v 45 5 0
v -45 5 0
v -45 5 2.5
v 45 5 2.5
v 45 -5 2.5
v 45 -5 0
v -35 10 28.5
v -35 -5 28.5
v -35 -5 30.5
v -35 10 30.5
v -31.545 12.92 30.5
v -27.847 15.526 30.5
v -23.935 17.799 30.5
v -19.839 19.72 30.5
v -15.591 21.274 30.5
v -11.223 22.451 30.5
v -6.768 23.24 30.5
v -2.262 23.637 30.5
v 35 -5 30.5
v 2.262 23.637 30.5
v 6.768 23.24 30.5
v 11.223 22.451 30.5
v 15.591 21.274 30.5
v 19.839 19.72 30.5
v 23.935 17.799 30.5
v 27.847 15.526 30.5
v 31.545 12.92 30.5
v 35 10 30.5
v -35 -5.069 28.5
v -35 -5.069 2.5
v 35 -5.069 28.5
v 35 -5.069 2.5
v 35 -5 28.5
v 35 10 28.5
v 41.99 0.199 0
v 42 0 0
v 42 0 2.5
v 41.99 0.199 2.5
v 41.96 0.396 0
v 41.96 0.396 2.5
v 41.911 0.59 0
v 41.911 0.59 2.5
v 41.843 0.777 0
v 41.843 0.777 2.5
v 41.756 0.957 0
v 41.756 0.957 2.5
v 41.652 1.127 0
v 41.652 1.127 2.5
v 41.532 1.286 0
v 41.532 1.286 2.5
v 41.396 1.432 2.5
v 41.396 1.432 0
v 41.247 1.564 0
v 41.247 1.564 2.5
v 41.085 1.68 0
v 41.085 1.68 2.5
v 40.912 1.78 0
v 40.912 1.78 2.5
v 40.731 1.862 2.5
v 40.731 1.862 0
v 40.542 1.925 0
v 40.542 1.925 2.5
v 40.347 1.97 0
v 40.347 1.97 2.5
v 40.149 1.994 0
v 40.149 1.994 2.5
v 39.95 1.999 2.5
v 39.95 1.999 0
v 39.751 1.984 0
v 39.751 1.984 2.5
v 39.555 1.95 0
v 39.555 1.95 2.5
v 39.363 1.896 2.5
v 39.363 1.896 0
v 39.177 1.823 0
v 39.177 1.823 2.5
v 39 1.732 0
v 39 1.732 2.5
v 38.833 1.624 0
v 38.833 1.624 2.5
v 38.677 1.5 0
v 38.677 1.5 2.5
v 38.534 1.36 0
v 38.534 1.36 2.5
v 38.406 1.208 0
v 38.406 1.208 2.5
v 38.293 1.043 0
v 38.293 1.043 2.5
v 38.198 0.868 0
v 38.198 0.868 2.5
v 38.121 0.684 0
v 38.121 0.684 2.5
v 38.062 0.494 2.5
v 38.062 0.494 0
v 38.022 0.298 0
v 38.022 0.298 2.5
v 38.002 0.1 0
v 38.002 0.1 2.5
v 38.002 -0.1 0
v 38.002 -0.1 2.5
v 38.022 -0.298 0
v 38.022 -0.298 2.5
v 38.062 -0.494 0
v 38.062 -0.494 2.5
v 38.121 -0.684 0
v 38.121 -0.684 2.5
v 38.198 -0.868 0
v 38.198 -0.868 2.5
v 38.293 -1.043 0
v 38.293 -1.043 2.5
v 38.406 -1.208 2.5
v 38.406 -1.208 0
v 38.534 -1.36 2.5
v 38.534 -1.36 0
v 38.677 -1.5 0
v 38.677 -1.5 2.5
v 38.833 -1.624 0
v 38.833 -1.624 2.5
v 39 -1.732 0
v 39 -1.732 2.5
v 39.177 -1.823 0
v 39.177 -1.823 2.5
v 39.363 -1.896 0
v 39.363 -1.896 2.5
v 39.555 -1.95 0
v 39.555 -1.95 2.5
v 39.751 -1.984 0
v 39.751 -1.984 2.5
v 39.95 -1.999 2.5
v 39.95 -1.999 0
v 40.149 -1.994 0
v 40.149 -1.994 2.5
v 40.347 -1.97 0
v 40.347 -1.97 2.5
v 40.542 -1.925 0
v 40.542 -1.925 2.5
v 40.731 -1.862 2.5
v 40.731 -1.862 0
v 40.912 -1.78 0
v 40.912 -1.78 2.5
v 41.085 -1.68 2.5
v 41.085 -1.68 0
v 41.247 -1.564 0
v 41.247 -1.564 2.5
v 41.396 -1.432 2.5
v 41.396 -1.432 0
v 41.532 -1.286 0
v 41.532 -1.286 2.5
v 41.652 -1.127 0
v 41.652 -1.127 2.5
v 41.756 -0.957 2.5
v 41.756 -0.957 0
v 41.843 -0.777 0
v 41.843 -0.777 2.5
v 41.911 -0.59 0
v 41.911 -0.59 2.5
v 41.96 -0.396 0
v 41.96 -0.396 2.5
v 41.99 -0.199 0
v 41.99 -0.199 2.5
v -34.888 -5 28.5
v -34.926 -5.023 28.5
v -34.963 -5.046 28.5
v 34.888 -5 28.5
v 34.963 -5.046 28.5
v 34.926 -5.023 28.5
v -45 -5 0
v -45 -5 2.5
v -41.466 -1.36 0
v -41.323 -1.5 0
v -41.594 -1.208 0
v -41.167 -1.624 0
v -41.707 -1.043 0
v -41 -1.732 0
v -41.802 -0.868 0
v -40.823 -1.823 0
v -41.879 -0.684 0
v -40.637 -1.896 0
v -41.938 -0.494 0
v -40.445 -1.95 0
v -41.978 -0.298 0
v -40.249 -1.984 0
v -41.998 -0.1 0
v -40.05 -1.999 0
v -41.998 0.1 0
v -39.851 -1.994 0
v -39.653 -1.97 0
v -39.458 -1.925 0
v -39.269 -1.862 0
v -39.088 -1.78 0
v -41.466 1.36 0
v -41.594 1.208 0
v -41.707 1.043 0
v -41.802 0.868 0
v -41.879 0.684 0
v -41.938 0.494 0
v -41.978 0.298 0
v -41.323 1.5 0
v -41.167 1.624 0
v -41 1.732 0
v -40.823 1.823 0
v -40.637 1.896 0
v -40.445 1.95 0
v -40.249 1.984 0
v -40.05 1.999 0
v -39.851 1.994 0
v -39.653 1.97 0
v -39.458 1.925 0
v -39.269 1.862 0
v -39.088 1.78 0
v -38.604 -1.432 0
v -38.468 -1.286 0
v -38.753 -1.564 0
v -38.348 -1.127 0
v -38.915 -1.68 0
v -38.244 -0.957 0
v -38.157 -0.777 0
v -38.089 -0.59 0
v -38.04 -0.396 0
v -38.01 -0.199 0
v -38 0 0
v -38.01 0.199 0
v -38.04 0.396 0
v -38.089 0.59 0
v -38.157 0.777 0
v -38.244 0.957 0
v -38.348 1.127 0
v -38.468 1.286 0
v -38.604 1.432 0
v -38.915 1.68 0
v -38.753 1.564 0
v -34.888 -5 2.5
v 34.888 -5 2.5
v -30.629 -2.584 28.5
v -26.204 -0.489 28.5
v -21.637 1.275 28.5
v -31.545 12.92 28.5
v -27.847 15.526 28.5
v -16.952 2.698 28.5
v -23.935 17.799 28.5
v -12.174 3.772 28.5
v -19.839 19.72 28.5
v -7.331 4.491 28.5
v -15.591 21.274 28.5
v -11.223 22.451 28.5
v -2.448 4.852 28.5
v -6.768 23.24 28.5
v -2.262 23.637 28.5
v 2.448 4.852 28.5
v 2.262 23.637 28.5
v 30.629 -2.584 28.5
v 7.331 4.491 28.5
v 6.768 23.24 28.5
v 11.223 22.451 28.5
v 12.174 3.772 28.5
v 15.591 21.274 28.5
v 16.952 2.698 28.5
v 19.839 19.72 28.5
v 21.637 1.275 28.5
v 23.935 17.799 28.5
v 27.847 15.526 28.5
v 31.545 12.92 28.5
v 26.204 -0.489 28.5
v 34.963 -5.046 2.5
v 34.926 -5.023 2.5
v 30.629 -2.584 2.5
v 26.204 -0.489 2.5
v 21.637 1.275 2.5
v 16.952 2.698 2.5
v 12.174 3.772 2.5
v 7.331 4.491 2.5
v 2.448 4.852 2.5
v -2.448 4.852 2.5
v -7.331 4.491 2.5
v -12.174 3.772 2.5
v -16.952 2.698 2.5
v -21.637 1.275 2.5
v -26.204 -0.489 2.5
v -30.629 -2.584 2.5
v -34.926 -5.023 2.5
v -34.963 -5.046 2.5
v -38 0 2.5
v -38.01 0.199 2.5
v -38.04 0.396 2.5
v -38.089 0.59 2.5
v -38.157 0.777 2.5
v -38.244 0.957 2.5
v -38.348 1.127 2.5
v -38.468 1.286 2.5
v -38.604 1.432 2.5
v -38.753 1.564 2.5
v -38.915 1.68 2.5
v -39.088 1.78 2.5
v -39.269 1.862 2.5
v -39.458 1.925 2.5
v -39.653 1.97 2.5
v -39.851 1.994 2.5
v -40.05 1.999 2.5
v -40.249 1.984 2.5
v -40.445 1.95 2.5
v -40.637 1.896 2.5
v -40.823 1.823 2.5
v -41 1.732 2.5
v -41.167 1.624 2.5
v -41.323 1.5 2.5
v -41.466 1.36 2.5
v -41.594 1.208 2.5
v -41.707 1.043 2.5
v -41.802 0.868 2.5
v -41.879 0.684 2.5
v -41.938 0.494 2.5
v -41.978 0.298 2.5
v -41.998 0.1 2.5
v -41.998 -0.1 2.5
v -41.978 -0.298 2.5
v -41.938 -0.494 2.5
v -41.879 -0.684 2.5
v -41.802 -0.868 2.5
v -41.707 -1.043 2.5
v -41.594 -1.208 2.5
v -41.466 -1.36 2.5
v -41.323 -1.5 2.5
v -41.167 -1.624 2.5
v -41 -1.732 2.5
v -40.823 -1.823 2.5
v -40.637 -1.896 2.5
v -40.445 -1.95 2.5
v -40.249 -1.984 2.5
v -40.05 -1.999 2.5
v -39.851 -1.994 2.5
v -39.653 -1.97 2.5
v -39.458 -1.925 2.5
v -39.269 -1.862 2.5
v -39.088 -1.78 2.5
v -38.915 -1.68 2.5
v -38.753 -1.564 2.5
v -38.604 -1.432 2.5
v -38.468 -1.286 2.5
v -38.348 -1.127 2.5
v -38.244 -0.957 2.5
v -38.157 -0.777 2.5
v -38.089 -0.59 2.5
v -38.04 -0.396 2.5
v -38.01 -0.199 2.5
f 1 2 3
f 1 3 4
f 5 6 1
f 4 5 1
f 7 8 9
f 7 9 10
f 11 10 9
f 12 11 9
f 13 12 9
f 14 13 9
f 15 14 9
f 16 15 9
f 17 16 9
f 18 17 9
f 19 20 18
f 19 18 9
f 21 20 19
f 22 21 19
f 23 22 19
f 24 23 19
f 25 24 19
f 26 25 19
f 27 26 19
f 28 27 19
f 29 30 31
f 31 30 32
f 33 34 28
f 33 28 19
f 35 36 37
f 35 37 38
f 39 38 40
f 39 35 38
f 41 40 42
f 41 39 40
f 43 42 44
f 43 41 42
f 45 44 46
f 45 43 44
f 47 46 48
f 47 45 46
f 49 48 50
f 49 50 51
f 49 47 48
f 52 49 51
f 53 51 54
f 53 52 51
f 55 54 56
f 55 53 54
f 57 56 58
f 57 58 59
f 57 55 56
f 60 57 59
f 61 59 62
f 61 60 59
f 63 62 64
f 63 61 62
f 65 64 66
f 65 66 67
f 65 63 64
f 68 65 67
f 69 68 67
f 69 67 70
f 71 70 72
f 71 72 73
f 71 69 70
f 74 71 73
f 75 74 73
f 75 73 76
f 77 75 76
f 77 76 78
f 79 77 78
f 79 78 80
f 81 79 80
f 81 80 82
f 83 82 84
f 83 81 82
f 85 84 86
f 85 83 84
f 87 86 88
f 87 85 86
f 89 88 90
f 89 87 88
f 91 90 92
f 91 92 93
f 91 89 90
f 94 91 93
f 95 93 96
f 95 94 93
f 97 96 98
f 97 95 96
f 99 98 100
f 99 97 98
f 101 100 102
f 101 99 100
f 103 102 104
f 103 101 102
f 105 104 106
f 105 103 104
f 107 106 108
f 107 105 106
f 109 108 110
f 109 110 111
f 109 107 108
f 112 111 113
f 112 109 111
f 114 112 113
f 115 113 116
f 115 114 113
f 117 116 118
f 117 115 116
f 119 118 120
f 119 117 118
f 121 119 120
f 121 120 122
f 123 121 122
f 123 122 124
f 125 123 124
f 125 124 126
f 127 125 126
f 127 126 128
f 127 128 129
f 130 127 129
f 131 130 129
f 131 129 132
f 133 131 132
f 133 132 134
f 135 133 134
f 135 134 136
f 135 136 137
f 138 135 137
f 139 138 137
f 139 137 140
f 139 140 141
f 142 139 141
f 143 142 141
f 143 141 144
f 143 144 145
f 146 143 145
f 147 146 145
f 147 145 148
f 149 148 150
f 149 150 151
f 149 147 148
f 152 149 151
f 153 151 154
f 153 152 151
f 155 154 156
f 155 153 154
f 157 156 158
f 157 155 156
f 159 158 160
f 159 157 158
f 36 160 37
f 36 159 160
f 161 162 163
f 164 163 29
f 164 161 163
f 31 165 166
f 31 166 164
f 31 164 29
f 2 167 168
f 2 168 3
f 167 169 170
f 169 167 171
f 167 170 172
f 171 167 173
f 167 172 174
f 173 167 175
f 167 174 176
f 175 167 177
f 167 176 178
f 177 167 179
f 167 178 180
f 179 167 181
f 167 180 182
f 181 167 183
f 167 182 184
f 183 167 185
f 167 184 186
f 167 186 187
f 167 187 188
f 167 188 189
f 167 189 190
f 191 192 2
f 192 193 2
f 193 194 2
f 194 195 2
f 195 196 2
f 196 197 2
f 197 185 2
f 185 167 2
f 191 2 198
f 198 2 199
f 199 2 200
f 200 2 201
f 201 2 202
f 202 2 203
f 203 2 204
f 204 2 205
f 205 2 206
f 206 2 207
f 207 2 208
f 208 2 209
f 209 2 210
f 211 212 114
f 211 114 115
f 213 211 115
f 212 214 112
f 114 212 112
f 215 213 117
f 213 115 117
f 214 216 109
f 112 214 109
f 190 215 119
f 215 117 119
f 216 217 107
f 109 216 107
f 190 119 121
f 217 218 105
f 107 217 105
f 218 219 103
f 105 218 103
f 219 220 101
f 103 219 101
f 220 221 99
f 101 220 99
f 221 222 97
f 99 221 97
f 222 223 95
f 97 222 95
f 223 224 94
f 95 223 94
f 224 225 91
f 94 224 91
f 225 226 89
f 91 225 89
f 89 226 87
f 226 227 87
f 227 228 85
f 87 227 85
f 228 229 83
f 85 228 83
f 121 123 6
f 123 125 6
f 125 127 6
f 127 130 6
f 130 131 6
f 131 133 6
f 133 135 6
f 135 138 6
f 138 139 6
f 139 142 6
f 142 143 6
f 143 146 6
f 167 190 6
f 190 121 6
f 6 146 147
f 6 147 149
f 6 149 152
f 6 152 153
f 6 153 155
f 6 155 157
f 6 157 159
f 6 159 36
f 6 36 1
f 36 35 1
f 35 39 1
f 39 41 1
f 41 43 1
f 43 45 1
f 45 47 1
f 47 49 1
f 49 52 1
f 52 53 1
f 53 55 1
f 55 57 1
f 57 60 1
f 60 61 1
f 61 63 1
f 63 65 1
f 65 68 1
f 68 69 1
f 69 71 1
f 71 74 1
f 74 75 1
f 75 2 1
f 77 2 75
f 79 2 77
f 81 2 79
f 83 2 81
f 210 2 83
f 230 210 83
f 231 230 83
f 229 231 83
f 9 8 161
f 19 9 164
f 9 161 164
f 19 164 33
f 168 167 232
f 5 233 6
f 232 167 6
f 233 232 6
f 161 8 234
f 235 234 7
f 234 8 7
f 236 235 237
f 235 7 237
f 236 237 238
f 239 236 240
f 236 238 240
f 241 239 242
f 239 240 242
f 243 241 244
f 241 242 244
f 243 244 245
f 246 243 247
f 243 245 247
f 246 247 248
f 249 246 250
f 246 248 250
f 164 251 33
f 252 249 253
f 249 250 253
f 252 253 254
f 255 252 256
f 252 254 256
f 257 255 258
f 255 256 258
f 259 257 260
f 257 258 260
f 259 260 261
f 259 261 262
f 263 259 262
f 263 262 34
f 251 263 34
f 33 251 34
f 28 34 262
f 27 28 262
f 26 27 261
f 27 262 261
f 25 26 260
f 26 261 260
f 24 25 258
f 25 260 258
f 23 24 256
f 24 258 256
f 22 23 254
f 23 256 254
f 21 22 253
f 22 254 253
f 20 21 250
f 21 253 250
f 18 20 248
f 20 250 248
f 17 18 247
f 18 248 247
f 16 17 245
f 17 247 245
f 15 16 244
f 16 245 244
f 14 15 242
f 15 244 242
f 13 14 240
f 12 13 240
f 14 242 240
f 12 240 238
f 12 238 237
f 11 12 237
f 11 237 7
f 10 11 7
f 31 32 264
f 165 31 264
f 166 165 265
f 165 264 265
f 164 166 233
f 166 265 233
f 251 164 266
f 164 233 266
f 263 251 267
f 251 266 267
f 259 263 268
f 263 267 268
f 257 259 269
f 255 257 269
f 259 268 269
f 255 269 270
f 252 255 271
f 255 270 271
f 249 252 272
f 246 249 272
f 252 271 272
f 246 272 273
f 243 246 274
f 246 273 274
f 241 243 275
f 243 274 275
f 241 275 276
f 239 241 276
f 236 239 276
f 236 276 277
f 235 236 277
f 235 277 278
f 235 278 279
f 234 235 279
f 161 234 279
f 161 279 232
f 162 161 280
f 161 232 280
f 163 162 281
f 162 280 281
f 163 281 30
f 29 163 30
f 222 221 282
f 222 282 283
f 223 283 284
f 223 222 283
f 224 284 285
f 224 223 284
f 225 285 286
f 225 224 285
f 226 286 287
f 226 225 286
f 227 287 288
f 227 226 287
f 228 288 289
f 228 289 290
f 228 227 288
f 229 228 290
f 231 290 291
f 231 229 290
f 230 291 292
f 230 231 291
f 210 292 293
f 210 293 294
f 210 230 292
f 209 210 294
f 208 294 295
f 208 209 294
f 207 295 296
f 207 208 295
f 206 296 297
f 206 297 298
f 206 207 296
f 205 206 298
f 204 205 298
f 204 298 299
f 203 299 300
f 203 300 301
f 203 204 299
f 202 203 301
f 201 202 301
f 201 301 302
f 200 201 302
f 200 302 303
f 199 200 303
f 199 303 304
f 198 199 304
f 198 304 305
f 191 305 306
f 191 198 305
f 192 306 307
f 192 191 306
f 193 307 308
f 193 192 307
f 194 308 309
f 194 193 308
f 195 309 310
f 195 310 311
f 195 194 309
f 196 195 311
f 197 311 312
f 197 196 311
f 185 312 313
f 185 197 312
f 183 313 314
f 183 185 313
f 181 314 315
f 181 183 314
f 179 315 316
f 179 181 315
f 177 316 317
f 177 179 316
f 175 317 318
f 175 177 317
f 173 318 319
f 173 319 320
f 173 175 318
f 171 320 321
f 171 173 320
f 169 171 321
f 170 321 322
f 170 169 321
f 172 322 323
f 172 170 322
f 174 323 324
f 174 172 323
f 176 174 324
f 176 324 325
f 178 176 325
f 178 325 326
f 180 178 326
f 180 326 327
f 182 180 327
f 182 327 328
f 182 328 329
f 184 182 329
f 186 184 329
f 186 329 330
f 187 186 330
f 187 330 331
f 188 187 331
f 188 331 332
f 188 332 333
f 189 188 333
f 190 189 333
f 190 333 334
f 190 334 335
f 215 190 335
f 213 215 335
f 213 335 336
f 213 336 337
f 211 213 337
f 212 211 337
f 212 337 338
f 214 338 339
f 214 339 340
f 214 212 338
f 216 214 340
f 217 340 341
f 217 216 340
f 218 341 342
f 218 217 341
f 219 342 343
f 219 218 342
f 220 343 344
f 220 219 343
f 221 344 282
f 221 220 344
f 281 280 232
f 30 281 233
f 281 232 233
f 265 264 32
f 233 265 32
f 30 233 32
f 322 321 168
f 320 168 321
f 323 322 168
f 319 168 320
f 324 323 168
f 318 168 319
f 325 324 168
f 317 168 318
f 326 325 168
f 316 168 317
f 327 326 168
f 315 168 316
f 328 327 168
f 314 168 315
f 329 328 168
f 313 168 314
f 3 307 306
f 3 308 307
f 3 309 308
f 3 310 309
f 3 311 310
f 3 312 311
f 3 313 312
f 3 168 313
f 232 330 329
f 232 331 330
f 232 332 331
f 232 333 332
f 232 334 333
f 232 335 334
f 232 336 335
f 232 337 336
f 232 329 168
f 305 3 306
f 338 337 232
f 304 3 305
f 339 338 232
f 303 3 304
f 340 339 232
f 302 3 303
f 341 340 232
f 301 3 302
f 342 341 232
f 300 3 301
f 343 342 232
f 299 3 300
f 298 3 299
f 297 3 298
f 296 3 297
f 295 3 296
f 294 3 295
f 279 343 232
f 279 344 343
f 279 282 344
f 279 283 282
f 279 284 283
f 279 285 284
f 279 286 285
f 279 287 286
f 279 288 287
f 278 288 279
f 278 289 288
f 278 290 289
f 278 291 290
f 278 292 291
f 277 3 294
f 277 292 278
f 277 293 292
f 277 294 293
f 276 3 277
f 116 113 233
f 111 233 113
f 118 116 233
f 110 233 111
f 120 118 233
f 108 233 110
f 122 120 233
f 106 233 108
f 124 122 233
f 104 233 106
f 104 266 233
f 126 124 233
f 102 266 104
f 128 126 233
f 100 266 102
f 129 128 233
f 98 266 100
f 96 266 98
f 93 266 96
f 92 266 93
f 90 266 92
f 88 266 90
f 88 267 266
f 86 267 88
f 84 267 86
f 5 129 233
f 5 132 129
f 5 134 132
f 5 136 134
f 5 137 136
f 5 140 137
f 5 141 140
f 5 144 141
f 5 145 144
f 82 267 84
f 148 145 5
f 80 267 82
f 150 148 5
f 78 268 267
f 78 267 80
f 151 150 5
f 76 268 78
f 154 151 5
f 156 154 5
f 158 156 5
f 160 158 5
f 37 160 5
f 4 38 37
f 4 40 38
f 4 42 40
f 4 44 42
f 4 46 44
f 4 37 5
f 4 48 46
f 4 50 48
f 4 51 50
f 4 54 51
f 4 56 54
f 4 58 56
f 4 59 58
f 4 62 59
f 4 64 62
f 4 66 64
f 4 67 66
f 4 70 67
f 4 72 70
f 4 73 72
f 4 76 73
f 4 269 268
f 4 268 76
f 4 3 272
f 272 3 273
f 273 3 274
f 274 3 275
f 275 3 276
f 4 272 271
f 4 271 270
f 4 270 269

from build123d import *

# Parameters (mm, degrees)
SKETCH_W     = 90
SKETCH_H     = 10
SKETCH_R     = 2
PAD_DEPTH    = 2.5
PAD001_DEPTH = 26
PAD002_DEPTH = 2


with BuildPart() as part:
    # Sketch → Pad (new body)
    with BuildSketch(Plane.XY):
        Rectangle(SKETCH_W, SKETCH_H)
        with Locations((-40, 0)):
            Circle(SKETCH_R, mode=Mode.SUBTRACT)
        with Locations((40, 0)):
            Circle(SKETCH_R, mode=Mode.SUBTRACT)
    extrude(amount=PAD_DEPTH)

    # Sketch001 → Pad001 (new body)
    with BuildSketch(Plane.XY.offset(2.5)):
        with BuildLine():
            ThreePointArc((35, -5.068991), (0, 4.896818), (-35, -5.068991))
            Line((-35, -5.068991), (35, -5.068991))
        make_face()
    extrude(amount=PAD001_DEPTH)

    # Sketch002 → Pad002 (new body)
    with BuildSketch(Plane.XY.offset(28.5)):
        with BuildLine():
            ThreePointArc((35, 10), (0, 23.686319), (-35, 10))
            Line((-35, -5), (-35, 10))
            Line((-35, -5), (35, -5))
            Line((35, 10), (35, -5))
        make_face()
    extrude(amount=PAD002_DEPTH)


solid = part.part
